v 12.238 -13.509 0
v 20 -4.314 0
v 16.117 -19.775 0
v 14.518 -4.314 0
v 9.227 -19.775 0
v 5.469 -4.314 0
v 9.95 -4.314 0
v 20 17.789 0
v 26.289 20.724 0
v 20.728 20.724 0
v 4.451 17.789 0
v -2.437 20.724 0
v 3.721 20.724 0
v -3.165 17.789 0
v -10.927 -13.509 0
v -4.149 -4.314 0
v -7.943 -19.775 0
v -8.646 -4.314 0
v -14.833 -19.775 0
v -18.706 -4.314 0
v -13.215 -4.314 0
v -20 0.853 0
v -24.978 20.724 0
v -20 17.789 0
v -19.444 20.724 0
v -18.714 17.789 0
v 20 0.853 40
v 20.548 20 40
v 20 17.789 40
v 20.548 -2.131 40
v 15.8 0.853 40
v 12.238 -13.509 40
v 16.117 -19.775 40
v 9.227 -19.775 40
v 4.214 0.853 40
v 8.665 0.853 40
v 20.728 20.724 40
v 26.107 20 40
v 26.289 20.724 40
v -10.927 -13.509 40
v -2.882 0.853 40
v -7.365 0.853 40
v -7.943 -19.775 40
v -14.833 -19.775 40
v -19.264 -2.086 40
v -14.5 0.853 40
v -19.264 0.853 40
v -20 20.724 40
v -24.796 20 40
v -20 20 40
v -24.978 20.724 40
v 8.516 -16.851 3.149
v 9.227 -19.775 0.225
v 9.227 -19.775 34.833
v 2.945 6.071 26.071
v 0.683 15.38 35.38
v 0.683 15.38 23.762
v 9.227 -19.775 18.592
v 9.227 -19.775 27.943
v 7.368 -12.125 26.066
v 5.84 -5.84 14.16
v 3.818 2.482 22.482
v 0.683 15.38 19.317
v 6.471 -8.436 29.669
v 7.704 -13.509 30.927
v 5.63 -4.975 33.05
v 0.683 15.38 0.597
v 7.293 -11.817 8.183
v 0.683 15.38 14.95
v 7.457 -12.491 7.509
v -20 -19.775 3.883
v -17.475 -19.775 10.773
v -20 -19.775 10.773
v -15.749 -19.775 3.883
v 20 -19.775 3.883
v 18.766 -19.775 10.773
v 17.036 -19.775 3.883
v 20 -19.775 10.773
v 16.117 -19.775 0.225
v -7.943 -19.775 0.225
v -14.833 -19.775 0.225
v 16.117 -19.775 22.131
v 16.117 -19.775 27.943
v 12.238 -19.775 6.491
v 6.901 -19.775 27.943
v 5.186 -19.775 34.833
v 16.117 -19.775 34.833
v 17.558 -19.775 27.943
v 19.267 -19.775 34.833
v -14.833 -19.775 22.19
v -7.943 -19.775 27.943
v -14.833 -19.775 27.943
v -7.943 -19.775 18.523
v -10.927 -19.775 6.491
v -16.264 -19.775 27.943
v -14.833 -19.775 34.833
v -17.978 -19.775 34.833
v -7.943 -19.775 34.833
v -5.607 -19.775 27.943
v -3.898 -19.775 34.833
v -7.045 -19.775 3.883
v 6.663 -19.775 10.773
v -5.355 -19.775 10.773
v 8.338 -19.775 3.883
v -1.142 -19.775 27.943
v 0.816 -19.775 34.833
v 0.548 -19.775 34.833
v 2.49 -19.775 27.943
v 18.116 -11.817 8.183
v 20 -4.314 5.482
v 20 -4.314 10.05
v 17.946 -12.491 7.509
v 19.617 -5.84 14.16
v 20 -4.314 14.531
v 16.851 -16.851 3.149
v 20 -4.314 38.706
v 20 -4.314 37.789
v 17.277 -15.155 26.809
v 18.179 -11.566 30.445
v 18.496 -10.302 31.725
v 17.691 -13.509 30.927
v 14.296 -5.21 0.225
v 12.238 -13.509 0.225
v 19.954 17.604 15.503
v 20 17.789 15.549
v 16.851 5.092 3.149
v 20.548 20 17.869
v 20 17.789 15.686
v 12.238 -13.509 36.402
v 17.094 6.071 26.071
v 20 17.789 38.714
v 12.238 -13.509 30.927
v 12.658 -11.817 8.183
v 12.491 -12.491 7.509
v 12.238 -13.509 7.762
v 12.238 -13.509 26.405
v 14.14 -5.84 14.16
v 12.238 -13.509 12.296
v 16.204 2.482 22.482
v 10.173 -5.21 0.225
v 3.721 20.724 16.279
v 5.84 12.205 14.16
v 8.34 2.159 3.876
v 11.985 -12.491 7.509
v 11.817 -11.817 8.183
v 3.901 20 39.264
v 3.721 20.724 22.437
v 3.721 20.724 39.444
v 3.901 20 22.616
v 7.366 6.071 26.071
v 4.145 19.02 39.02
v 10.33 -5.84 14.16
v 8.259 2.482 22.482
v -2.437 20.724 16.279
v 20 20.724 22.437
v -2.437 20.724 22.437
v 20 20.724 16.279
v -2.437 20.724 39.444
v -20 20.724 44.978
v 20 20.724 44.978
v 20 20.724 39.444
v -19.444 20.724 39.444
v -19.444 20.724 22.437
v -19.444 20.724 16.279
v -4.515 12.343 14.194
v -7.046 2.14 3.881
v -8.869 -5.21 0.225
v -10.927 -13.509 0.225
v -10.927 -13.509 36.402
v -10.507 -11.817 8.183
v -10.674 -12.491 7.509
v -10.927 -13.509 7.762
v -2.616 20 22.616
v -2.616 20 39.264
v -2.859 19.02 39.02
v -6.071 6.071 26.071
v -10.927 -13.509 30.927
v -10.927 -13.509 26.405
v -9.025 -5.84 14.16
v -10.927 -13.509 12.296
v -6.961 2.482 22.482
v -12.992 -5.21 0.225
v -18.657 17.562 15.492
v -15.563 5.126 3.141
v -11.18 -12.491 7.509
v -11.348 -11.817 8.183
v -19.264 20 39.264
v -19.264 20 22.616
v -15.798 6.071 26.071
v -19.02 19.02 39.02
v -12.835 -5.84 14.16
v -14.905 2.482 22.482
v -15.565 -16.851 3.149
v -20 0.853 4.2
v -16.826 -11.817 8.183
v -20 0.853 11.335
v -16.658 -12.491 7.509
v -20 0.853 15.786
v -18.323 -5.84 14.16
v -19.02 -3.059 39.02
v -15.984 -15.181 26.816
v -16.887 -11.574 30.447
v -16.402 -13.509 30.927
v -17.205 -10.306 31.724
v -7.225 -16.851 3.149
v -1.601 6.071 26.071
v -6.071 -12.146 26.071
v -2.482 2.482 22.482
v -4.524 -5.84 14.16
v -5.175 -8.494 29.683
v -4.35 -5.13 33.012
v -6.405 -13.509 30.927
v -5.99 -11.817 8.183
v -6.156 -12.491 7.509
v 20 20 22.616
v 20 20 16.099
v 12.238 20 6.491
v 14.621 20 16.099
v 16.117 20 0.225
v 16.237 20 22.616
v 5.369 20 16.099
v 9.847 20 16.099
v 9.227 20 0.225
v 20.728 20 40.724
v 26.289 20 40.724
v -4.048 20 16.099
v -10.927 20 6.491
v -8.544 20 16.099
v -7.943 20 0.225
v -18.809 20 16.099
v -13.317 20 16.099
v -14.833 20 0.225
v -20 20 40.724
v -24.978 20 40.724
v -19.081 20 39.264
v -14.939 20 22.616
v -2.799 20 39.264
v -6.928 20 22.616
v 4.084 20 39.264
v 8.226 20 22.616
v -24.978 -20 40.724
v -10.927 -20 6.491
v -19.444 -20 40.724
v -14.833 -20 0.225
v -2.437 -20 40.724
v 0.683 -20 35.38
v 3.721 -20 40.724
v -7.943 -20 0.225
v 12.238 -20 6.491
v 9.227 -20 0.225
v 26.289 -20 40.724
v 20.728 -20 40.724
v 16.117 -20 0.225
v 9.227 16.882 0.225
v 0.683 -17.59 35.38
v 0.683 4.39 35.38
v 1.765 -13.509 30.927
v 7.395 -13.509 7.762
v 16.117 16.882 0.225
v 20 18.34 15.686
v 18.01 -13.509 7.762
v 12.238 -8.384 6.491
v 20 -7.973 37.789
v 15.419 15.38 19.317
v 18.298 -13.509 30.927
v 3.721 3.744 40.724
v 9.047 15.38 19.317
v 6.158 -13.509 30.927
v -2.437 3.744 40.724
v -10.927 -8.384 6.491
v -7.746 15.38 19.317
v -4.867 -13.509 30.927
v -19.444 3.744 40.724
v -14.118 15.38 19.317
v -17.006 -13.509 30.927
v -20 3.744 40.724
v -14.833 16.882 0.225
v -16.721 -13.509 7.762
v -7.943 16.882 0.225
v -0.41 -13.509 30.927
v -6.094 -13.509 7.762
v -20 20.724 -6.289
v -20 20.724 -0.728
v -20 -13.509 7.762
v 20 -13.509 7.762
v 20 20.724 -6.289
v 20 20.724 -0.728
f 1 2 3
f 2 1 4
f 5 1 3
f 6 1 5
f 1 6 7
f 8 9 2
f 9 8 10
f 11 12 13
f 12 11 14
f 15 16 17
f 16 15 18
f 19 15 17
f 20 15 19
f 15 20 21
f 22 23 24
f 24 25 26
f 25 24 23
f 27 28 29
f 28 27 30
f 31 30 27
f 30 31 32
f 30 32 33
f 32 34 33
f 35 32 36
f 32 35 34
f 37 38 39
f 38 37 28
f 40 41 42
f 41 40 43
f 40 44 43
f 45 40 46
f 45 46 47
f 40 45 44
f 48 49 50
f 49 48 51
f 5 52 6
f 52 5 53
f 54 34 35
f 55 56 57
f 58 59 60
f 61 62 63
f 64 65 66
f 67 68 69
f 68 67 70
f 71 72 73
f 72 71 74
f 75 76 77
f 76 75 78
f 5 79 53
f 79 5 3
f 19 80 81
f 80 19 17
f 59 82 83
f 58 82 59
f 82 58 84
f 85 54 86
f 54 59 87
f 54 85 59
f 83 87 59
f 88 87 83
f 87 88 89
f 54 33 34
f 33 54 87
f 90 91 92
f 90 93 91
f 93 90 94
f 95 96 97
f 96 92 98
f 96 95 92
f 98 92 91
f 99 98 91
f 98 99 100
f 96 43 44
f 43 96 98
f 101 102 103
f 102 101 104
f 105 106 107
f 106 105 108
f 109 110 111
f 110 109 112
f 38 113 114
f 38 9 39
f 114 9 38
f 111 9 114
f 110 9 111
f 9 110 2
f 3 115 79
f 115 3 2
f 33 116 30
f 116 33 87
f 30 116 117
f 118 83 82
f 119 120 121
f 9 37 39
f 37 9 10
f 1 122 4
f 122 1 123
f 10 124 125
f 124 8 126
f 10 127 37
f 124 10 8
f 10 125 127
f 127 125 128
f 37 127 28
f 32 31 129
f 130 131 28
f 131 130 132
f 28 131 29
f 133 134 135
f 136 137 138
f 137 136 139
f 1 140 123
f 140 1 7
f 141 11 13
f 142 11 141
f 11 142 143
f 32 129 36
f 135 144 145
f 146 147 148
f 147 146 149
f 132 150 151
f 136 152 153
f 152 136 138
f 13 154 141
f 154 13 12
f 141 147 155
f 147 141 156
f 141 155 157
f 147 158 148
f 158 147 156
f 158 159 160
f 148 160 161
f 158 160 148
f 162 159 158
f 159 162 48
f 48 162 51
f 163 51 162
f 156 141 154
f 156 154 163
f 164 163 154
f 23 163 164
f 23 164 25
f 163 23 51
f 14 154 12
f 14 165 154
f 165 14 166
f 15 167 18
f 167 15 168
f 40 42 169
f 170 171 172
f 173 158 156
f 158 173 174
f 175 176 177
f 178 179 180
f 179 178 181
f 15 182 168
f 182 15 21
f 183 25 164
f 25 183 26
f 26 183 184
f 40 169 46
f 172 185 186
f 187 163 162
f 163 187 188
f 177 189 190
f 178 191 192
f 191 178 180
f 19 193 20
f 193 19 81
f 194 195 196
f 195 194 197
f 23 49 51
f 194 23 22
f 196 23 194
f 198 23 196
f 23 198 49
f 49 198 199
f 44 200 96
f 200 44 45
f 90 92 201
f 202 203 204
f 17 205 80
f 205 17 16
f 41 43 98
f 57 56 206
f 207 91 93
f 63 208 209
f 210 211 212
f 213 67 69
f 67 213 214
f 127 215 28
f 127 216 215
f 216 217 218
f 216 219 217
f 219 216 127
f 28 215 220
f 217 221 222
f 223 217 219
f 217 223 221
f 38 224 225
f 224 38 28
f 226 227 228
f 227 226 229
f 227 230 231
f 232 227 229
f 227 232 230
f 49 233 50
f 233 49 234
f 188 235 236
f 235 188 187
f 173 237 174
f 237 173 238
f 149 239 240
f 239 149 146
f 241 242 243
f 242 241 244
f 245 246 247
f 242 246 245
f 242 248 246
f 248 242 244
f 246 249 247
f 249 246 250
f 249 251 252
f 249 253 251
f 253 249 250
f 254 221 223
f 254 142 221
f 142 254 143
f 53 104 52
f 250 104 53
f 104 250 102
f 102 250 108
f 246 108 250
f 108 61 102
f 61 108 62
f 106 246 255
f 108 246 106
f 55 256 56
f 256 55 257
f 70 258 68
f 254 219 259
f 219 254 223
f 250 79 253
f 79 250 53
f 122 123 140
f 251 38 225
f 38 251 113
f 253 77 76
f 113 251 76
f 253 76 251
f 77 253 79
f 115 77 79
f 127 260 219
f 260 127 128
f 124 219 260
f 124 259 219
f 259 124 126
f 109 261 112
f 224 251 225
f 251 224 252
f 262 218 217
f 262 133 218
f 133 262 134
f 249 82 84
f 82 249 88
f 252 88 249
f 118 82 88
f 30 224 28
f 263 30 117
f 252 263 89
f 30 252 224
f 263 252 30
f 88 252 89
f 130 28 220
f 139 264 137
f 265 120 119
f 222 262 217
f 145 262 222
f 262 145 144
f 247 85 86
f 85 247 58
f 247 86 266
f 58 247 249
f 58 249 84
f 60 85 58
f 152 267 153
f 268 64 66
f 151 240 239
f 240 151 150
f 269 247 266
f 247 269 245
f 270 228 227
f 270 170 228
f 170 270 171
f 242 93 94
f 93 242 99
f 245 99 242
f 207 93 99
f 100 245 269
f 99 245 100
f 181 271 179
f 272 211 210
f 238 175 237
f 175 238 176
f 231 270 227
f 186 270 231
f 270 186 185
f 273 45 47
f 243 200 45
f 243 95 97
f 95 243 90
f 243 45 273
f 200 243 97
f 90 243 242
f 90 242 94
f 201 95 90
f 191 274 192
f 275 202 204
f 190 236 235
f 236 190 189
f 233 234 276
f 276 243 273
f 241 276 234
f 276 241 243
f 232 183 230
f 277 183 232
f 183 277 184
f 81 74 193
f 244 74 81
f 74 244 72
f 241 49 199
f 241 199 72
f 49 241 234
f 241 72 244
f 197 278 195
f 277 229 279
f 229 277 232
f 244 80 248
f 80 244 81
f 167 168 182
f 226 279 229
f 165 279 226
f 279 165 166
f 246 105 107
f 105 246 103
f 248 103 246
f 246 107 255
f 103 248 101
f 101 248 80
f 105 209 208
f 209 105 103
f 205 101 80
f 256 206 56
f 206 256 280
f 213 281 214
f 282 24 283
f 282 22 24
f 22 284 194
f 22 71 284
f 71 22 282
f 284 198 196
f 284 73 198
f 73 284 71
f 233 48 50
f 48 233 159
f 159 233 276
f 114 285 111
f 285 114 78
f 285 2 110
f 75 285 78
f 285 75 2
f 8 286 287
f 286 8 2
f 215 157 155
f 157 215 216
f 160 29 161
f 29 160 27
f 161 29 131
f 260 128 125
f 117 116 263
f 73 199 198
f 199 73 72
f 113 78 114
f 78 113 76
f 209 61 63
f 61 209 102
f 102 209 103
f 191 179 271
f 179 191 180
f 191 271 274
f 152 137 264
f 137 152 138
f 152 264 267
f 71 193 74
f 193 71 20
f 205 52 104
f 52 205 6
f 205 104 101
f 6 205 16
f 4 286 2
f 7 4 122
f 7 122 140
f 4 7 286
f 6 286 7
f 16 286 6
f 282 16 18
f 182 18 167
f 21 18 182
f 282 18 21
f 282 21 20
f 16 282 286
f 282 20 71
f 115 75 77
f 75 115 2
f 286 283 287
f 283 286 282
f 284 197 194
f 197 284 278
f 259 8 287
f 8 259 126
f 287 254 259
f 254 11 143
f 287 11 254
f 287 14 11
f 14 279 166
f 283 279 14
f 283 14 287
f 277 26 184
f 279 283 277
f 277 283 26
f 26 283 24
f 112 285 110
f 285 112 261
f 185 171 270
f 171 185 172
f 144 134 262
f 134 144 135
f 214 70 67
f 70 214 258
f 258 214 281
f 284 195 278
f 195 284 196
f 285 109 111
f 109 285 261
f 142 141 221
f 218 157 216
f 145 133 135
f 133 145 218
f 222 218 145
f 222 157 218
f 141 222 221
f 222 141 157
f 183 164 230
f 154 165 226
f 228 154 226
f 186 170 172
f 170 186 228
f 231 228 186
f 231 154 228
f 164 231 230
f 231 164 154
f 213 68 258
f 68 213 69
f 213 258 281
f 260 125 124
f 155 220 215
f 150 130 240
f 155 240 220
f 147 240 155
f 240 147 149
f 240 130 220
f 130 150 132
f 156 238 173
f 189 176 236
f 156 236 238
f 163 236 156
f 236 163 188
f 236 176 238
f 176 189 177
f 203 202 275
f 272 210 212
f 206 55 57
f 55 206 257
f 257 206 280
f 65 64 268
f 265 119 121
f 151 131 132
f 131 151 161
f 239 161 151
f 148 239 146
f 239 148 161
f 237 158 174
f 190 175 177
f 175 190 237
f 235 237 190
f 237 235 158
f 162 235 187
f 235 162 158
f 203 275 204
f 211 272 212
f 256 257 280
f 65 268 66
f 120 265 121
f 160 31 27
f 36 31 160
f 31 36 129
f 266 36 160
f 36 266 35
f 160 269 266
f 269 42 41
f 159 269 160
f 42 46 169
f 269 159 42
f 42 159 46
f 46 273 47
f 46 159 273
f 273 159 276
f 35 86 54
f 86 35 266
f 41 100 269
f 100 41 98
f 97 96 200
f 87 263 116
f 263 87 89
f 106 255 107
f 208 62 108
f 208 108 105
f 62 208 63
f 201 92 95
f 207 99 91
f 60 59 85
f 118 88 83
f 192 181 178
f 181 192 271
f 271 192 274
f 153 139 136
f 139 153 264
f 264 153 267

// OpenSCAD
// -*- mode: SCAD ; c-file-style: "ellemtel" ; coding: utf-8 -*-
//
// A customizable GEB-style logo cube
//
// (c) 2018 Roland Sieker <ospalh@gmail.com>
// Licence: CC-BY-SA 4.0


// Three letters
letters = "WWW"; //

// Pick one of the Google fonts.
font = "Praxis LT";


/* [Hidden] */

// Done with the customizer

size = 40;


// *******************************************************
// End setup



// *******************************************************
// Generate the parts

tricube();


// *******************************************************
// Code for the parts themselves

module tricube()
{
   // intersection()
   {
      letter(letters[0]);
      translate([0,size/2,size/2])
      {
         rotate([90,0,0])
         {
            letter(letters[1]);
         }
      }
      translate([-size/2,0,size/2])
      {
         rotate([0,90,0])
         {
            letter(letters[2]);
         }
      }

   }
}




module letter(c)
{
   linear_extrude(size)
   {
      text(c, font=font, size=size, halign="center", valign="center");
   }
}
